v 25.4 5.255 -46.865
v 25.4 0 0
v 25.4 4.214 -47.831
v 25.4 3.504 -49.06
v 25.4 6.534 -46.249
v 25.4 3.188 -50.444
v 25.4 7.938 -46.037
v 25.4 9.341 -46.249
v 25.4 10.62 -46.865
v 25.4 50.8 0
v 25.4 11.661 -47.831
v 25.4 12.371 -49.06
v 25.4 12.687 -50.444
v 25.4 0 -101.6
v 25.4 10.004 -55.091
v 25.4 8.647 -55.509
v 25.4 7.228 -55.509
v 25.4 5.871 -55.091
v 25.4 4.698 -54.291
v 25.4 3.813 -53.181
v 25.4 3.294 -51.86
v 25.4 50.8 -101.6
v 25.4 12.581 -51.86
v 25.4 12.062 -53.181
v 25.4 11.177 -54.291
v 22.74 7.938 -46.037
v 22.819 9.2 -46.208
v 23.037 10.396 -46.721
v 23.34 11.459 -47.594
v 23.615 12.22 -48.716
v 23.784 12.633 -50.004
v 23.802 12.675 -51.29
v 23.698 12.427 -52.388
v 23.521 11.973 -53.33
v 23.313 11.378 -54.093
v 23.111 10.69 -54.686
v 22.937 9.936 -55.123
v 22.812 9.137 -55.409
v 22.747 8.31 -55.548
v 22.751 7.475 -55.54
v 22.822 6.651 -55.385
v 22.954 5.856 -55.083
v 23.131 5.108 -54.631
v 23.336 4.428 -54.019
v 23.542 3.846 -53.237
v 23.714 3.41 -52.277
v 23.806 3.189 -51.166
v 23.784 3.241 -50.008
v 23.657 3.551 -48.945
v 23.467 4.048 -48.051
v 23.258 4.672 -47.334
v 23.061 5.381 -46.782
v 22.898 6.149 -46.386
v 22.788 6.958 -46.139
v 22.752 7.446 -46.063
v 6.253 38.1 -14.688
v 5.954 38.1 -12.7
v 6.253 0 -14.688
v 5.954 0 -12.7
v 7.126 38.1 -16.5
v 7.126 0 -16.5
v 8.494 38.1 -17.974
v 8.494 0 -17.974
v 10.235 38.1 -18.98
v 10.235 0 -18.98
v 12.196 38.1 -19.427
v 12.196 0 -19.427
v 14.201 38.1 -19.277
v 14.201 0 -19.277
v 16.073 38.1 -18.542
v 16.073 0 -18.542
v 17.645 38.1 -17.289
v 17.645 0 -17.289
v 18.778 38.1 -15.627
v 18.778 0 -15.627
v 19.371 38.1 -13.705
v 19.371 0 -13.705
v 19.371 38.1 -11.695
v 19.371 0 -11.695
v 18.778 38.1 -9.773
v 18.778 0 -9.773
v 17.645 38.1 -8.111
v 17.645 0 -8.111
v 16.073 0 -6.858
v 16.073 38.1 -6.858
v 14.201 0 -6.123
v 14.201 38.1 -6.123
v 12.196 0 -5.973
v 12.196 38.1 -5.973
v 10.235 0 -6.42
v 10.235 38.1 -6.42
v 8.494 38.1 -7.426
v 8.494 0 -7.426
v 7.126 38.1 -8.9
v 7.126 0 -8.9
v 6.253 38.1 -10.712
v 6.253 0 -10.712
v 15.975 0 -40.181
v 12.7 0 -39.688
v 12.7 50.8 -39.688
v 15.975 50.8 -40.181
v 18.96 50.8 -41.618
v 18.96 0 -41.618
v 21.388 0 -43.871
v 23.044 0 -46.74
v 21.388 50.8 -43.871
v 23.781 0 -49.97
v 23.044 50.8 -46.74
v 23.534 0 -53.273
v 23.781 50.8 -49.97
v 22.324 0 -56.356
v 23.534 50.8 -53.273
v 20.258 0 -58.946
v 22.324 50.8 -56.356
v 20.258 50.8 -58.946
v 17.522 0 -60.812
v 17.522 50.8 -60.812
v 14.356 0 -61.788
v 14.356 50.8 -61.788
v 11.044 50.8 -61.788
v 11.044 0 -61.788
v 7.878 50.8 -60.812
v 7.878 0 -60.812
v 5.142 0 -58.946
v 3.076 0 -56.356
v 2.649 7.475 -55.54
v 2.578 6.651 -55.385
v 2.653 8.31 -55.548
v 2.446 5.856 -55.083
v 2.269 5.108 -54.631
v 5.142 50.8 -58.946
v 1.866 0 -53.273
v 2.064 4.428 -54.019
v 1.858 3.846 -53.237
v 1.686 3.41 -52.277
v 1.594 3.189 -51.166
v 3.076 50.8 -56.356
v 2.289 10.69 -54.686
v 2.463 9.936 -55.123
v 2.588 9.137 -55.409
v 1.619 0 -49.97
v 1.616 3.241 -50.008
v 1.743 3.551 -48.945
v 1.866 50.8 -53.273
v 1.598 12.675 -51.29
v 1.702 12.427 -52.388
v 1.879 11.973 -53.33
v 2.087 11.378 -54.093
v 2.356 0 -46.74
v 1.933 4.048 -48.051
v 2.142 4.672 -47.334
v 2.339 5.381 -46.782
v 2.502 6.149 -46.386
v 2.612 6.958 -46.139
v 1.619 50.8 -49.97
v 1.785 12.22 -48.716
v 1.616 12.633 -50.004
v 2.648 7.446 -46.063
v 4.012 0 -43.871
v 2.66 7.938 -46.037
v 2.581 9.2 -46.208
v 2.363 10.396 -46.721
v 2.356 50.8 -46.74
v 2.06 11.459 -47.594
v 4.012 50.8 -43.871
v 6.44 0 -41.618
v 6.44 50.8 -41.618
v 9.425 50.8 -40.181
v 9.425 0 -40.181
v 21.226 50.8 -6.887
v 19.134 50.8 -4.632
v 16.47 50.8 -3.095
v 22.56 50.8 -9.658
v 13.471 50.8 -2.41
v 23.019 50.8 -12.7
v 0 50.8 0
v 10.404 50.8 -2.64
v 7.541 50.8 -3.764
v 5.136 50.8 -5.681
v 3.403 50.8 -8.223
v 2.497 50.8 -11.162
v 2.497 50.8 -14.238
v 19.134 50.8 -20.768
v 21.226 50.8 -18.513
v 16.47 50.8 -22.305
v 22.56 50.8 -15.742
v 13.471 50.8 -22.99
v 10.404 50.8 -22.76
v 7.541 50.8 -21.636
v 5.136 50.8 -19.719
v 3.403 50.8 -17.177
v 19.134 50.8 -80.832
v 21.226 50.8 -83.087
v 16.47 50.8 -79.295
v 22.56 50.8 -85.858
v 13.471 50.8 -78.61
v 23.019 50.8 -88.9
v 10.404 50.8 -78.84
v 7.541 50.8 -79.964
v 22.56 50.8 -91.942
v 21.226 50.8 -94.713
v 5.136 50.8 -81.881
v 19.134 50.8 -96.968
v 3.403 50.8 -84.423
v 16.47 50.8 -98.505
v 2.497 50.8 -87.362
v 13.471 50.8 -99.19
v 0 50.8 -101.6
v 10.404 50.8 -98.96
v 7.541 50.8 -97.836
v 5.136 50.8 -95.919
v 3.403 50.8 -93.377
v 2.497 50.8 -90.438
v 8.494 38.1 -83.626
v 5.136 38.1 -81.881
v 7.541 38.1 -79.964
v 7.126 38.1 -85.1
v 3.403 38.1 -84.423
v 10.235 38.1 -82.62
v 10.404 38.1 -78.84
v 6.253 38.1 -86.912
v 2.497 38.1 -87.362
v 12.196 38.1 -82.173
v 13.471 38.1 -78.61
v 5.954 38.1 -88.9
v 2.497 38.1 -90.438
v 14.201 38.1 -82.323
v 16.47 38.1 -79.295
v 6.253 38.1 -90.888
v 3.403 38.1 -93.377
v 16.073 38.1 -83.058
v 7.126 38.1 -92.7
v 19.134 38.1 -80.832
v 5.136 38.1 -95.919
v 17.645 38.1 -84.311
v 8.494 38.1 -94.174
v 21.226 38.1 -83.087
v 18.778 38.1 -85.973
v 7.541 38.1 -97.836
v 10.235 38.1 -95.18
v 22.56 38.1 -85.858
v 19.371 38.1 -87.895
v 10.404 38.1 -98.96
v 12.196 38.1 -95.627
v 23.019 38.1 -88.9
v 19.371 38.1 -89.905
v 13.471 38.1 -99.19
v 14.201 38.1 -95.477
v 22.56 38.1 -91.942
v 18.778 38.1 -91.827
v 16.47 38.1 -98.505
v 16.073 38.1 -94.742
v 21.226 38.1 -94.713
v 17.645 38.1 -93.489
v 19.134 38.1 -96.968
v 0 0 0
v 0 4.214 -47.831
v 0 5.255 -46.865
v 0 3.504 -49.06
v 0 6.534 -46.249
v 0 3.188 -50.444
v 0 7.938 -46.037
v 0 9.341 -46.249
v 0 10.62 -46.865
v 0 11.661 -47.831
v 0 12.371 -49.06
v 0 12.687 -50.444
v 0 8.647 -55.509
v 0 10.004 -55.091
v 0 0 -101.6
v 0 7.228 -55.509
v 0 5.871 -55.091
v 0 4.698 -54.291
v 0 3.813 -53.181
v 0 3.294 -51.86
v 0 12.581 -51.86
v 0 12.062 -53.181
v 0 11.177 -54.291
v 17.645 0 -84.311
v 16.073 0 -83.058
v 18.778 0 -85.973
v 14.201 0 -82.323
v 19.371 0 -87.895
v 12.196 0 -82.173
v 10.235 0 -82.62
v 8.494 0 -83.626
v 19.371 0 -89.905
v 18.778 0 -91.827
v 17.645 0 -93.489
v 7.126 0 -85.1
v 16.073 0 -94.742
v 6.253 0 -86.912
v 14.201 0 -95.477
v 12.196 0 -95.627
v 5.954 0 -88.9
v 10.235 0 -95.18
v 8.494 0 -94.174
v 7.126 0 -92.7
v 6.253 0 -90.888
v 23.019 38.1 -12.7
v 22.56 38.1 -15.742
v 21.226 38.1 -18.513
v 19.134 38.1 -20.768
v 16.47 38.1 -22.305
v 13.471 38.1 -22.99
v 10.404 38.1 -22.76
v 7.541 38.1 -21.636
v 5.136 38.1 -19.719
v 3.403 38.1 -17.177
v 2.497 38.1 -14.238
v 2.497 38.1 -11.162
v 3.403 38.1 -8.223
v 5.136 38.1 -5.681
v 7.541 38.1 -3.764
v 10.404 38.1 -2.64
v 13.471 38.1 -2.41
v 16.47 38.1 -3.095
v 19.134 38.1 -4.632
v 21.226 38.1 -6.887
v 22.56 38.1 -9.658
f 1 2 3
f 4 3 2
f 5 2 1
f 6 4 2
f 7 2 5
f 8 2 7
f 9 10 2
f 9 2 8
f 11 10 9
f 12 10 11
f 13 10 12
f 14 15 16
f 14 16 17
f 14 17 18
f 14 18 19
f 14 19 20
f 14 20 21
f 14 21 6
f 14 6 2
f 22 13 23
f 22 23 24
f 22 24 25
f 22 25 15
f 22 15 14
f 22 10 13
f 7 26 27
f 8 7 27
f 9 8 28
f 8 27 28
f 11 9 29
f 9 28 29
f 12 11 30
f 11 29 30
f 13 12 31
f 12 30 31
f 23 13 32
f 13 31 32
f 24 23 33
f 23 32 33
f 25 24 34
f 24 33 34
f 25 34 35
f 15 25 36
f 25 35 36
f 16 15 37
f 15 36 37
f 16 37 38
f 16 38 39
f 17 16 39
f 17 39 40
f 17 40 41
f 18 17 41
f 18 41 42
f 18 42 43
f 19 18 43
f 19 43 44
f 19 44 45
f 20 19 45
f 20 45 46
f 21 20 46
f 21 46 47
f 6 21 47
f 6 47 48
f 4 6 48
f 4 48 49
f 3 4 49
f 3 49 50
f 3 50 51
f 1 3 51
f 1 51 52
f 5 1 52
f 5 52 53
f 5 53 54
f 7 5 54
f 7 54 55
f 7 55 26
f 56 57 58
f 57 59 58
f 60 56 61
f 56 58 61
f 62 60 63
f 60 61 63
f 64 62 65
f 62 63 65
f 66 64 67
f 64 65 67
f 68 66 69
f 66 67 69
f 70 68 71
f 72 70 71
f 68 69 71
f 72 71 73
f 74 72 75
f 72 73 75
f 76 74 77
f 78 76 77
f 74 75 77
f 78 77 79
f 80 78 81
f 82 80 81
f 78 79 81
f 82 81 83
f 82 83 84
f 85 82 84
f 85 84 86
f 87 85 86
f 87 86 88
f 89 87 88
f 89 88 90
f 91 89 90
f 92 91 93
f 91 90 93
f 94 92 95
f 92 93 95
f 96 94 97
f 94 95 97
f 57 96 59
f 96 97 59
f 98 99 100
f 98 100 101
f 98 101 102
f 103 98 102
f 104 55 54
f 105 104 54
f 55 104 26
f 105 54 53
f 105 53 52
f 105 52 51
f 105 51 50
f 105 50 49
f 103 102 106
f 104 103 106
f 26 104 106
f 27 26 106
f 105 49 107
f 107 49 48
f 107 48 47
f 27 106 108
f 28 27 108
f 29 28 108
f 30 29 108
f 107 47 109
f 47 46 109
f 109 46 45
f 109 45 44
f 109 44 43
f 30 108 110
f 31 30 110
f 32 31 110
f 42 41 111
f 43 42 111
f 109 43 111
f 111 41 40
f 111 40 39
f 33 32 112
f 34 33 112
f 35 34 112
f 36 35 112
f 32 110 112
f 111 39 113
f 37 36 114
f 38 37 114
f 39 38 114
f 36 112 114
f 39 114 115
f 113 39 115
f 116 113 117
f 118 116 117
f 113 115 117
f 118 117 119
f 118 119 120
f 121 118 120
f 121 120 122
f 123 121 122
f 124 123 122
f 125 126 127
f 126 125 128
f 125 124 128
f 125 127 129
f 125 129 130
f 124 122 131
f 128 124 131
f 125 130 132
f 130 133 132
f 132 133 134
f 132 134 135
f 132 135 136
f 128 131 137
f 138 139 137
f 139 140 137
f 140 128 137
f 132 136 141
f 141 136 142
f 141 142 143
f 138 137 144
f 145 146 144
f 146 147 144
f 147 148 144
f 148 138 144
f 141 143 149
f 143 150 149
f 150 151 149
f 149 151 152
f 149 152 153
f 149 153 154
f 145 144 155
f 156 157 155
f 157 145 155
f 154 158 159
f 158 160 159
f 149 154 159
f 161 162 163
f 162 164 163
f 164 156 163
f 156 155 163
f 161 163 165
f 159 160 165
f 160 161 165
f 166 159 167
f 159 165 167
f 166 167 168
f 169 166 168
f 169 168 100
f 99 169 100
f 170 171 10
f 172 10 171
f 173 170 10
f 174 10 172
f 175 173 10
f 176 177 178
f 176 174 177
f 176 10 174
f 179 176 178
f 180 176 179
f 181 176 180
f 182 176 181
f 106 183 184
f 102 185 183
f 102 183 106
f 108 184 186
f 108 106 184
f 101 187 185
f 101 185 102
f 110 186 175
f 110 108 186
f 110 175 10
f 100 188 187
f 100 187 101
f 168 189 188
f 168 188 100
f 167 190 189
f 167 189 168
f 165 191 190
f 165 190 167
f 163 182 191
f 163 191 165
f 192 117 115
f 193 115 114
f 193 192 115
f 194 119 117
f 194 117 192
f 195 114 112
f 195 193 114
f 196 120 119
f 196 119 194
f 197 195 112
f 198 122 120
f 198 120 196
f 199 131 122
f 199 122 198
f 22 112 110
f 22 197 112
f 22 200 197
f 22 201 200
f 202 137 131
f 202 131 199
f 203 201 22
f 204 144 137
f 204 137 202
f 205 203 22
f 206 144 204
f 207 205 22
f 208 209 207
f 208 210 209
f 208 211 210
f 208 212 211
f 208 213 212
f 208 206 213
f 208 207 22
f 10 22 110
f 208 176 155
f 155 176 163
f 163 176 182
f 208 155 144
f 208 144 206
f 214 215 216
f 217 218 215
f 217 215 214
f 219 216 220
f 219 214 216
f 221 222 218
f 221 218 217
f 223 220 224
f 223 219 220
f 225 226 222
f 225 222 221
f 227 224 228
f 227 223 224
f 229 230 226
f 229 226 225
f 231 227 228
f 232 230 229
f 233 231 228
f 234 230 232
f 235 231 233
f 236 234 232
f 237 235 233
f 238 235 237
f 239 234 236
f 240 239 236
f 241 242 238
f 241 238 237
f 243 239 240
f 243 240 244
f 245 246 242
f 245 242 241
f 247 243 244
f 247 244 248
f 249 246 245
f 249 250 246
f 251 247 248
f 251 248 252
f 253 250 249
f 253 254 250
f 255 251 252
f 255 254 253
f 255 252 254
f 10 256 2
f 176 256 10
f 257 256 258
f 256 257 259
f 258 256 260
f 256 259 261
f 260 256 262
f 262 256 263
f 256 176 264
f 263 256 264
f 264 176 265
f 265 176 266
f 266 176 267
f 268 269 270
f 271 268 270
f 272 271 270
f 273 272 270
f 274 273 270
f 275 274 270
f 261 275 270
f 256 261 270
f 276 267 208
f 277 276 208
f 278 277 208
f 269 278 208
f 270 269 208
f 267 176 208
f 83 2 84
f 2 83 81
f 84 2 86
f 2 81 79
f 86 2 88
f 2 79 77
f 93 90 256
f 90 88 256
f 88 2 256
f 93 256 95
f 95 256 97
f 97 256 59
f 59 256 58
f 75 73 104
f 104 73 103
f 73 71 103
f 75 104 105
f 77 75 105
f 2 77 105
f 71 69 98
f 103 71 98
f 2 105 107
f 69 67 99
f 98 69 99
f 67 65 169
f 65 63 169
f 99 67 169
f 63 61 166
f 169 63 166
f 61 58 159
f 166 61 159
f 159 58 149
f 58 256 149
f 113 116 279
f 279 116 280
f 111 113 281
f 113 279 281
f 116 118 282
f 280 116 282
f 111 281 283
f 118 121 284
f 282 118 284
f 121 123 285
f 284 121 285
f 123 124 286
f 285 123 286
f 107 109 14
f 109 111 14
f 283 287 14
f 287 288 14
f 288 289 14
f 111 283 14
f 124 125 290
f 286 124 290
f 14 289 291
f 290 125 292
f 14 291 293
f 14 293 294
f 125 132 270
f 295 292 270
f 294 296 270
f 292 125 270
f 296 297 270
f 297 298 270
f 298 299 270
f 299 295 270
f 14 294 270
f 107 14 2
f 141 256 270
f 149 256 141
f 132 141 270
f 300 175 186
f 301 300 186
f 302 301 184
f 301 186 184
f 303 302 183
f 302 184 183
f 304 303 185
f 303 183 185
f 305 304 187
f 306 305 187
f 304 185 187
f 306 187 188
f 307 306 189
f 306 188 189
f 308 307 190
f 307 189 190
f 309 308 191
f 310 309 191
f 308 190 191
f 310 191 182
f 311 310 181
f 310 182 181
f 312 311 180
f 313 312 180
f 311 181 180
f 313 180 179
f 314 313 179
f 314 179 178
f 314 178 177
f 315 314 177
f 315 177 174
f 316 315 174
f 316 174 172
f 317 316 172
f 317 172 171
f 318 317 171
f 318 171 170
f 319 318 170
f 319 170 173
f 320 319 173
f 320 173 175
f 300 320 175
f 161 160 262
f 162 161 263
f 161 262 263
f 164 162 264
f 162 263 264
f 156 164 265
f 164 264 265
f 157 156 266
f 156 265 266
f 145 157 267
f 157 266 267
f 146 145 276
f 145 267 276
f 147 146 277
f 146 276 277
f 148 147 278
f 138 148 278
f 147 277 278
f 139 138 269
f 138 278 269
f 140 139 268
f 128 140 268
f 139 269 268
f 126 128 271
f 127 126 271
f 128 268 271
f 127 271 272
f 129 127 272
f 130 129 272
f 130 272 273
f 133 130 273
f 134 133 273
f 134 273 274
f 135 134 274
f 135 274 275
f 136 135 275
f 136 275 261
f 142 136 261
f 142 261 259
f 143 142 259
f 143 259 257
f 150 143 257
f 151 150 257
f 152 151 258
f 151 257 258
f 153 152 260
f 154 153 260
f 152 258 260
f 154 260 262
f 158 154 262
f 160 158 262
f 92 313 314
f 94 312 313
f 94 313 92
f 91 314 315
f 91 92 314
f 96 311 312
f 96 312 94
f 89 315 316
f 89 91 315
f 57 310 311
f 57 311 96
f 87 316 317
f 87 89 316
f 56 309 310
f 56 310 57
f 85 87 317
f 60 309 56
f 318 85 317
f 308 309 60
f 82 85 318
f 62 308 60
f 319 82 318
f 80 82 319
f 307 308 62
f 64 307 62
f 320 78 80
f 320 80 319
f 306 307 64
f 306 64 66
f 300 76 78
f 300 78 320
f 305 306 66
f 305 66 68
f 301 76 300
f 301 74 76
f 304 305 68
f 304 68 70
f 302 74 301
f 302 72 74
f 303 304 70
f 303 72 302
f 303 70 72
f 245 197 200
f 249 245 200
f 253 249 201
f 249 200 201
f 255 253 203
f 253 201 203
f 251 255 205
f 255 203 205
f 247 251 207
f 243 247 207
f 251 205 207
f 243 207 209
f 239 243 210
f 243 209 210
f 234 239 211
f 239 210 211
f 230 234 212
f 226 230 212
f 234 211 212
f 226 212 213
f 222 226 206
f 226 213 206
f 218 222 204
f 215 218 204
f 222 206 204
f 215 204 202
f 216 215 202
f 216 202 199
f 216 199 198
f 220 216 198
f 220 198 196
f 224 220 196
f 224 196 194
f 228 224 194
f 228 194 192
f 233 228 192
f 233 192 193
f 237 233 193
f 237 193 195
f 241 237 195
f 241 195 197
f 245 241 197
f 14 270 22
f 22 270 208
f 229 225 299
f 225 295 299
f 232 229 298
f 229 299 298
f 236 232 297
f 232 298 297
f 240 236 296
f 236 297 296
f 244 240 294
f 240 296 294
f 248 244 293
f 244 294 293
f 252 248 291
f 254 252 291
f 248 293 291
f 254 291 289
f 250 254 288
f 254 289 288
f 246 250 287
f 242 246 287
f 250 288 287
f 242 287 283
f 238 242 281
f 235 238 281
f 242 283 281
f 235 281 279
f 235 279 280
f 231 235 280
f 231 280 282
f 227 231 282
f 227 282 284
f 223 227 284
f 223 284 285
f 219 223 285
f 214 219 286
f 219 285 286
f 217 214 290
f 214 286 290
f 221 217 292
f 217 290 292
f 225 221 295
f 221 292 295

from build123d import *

# Parameters (mm, degrees)
SKETCH1_W                                        = 101.6
SKETCH1_H                                        = 50.8
BOSS_EXTRUDE1_DEPTH                              = 25.4
SKETCH2_R                                        = 11.1125
CUT_EXTRUDE1_DEPTH                               = 50.8
CBORE_FOR_1_2_SOCKET_HEAD_CAP_SCREW1_D           = 13.49248
CBORE_FOR_1_2_SOCKET_HEAD_CAP_SCREW1_DEPTH       = 50.8
CBORE_FOR_1_2_SOCKET_HEAD_CAP_SCREW1_CBORE_D     = 20.6375
CBORE_FOR_1_2_SOCKET_HEAD_CAP_SCREW1_CBORE_DEPTH = 12.7
CBORE_FOR_1_2_SOCKET_HEAD_CAP_SCREW1_TIP         = 4.053549943
SKETCH8_R                                        = 4.7625
CUT_EXTRUDE2_DEPTH                               = 117.397422652


with BuildPart() as part:
    # Sketch1 → Boss-Extrude1 (new body)
    with BuildSketch(Plane(origin=(0, 0, 0), x_dir=(0, 0, -1), z_dir=(1, 0, 0))):
        with Locations((50.8, 25.4)):
            Rectangle(SKETCH1_W, SKETCH1_H)
    extrude(amount=BOSS_EXTRUDE1_DEPTH)

    # Sketch2 → Cut-Extrude1 (cut)
    with BuildSketch(Plane(origin=(0, 50.8, 0), x_dir=(1, 0, 0), z_dir=(0, 1, 0))):
        with Locations(Location((12.7, 50.8, 0), (0, 0, 270))):
            Circle(SKETCH2_R)
    extrude(amount=-CUT_EXTRUDE1_DEPTH, mode=Mode.SUBTRACT)

    # CBORE for 1/2 Socket Head Cap Screw1
    with Locations(Plane(origin=(0, 50.8, 0), x_dir=(1, 0, 0), z_dir=(0, 1, 0))):
        with Locations((12.7, 88.9), (12.7, 12.7)):
            CounterBoreHole(CBORE_FOR_1_2_SOCKET_HEAD_CAP_SCREW1_D / 2, CBORE_FOR_1_2_SOCKET_HEAD_CAP_SCREW1_CBORE_D / 2, CBORE_FOR_1_2_SOCKET_HEAD_CAP_SCREW1_CBORE_DEPTH, depth=CBORE_FOR_1_2_SOCKET_HEAD_CAP_SCREW1_DEPTH)
            with Locations((0, 0, -(CBORE_FOR_1_2_SOCKET_HEAD_CAP_SCREW1_DEPTH + CBORE_FOR_1_2_SOCKET_HEAD_CAP_SCREW1_TIP / 2))):  # 118° drill point
                Cone(0, CBORE_FOR_1_2_SOCKET_HEAD_CAP_SCREW1_D / 2, CBORE_FOR_1_2_SOCKET_HEAD_CAP_SCREW1_TIP, mode=Mode.SUBTRACT)

    # Sketch8 → Cut-Extrude2 (cut, through all)
    with BuildSketch(Plane.ZY):
        with Locations((-50.8, 7.9375)):
            Circle(SKETCH8_R)
    extrude(amount=-CUT_EXTRUDE2_DEPTH, mode=Mode.SUBTRACT)


solid = part.part
